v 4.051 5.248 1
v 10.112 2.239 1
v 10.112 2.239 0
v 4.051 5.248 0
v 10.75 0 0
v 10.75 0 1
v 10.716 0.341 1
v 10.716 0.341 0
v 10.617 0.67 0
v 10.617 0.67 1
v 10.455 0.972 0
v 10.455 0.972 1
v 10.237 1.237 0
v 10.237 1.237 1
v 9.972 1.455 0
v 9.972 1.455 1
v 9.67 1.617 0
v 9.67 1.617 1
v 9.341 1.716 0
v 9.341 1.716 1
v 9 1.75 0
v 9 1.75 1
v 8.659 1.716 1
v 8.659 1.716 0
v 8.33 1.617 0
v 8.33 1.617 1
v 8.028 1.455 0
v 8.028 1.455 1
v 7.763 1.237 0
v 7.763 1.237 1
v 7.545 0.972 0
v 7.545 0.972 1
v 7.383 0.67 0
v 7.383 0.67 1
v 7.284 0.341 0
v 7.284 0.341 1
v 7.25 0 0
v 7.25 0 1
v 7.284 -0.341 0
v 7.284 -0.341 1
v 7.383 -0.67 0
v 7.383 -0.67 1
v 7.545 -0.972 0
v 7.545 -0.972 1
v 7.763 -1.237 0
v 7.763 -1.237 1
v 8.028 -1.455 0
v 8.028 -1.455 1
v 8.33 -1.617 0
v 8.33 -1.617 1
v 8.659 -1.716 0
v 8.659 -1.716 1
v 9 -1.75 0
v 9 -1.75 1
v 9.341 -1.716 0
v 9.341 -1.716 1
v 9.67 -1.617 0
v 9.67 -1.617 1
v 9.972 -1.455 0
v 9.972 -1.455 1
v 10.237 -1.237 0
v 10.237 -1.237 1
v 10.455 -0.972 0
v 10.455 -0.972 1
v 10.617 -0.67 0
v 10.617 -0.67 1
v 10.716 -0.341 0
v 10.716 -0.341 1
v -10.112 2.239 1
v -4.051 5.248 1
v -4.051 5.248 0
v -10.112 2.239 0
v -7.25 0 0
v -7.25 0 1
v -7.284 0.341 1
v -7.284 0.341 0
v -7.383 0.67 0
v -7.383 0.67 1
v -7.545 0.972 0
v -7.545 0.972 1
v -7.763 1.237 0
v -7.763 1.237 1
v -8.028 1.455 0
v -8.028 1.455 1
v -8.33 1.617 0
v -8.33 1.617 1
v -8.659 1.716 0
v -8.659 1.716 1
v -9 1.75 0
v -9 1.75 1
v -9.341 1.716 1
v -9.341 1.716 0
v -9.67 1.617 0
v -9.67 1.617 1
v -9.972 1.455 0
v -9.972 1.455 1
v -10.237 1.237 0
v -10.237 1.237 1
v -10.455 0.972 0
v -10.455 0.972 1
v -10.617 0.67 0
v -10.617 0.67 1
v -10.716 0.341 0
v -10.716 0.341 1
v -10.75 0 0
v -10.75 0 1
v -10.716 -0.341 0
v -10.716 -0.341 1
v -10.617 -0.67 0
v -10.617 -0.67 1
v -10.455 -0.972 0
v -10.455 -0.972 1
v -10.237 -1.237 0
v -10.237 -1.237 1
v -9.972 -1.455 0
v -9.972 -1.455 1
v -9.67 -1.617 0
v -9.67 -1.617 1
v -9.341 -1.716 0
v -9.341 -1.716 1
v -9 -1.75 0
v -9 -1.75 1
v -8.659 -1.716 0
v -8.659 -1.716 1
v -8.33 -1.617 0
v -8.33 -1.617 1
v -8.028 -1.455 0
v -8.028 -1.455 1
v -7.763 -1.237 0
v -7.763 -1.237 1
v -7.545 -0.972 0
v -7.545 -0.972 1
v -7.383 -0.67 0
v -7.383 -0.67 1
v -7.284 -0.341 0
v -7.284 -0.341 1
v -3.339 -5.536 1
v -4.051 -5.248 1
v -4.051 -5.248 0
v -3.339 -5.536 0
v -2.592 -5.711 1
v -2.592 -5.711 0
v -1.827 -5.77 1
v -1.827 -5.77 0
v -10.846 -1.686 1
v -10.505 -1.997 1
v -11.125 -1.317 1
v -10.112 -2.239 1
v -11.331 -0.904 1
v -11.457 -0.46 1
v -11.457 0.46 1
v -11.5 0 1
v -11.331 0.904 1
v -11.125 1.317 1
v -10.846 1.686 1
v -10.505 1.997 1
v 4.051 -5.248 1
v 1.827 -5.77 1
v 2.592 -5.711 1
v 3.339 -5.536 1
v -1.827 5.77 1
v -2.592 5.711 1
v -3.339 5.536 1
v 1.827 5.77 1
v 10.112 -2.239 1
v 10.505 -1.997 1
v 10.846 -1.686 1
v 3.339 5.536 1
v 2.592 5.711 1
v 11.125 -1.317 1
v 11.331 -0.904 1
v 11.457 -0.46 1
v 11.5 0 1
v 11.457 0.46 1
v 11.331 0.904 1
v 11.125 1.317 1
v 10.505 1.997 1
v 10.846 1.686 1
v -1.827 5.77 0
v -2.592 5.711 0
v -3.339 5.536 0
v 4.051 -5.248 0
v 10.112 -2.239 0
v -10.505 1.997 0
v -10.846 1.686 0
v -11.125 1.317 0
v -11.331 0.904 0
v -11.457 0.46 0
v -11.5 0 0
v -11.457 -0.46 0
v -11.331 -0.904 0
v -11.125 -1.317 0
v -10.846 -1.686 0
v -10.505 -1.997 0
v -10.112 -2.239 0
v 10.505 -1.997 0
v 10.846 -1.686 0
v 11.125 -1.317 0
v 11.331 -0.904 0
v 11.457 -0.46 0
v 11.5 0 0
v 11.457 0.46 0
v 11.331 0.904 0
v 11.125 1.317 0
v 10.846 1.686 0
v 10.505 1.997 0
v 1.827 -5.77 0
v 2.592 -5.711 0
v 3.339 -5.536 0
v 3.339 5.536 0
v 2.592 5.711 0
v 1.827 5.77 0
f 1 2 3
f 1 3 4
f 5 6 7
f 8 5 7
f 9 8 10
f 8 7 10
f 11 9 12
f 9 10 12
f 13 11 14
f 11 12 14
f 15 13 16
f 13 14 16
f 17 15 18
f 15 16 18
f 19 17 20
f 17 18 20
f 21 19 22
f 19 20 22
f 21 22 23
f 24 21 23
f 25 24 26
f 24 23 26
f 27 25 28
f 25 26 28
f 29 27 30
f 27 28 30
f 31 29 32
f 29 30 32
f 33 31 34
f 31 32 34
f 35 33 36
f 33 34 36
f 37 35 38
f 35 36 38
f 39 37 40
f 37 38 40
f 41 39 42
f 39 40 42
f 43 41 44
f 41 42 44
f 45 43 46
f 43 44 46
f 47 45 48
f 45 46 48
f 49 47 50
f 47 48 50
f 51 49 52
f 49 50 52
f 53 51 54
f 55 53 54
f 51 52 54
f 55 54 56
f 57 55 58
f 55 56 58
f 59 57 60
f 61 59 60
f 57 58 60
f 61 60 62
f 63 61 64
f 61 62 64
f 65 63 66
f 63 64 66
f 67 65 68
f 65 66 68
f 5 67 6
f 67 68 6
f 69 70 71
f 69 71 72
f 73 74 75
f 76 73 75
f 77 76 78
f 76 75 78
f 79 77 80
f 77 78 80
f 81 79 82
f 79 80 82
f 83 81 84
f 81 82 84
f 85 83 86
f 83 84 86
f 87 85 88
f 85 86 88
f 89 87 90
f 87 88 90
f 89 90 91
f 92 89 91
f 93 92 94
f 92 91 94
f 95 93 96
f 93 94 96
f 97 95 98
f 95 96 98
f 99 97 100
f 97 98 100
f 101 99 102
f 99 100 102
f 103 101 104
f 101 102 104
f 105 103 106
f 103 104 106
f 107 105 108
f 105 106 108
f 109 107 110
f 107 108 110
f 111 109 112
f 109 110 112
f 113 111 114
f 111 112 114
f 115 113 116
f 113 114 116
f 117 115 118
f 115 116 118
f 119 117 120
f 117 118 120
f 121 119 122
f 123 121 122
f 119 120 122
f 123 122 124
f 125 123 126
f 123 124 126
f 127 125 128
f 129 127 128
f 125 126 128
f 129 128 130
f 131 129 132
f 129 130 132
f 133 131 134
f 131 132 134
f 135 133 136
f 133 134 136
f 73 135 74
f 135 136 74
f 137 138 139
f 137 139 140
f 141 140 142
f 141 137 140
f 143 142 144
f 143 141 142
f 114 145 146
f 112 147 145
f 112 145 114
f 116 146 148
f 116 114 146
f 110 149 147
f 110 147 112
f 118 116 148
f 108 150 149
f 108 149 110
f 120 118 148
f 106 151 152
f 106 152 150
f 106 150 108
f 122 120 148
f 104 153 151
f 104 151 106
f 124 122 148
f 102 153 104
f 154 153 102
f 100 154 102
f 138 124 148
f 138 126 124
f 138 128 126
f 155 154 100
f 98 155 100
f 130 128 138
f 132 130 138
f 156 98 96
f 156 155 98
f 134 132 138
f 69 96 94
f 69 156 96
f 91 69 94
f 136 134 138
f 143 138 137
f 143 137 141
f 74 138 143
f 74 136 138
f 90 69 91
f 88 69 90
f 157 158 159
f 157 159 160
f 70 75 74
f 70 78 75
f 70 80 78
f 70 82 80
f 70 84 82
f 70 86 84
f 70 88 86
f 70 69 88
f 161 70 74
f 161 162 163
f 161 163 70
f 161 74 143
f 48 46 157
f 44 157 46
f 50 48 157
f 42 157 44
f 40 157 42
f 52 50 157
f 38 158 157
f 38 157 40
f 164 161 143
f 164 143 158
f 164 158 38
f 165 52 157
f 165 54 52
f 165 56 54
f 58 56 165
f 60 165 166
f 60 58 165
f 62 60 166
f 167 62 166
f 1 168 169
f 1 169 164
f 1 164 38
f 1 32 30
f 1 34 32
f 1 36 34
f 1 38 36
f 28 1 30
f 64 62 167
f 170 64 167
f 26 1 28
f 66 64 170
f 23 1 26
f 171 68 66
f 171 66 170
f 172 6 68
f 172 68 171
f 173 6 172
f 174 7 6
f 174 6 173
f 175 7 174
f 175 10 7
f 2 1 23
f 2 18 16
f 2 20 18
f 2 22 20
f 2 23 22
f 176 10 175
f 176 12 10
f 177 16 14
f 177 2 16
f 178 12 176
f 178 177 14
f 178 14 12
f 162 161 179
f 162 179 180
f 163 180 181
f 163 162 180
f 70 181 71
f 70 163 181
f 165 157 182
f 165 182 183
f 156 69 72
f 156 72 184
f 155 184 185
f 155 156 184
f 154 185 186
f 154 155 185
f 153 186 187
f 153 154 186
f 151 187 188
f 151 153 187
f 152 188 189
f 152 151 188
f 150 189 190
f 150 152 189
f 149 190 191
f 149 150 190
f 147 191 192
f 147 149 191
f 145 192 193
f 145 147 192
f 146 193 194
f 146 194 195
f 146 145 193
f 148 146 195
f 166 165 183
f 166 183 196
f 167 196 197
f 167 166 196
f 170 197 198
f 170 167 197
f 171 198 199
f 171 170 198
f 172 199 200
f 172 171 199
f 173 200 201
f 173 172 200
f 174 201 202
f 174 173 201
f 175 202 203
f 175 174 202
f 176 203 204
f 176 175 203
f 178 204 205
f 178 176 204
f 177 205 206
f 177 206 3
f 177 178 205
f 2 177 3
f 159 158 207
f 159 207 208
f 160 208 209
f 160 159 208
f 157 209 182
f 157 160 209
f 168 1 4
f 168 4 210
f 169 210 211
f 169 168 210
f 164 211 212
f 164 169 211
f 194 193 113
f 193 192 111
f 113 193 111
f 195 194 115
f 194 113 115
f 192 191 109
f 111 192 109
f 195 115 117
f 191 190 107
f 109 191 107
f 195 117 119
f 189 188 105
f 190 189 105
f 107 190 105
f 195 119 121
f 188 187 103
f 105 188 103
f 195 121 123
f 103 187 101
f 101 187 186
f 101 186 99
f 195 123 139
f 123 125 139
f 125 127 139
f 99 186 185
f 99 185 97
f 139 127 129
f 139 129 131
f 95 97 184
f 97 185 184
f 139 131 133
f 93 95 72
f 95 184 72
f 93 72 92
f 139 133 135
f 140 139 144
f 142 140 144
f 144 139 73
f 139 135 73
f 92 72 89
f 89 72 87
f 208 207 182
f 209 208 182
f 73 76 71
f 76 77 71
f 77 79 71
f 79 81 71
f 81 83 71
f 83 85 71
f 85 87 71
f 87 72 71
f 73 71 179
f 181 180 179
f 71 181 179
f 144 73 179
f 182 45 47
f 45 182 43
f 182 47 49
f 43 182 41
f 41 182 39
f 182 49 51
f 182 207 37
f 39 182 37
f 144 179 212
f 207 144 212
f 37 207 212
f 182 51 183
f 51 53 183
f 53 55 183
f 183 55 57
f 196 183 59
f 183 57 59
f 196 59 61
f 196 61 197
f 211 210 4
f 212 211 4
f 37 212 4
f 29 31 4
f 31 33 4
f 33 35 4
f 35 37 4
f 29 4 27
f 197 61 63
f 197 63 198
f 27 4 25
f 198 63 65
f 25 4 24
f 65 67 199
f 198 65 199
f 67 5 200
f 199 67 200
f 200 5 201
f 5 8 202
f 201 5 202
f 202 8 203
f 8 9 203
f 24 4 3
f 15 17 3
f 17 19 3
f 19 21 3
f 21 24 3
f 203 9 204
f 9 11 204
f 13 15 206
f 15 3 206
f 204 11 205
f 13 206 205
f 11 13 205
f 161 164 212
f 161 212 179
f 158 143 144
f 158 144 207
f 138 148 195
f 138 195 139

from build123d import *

# Parameters (mm, degrees)
F4_R     = 1.75
F5_DEPTH = 1


with BuildPart() as f5:
    # F4 (on offset) → F5 (new body, through all)
    with BuildSketch(Plane.XY.offset(1)):
        with BuildLine():
            Line((-4.0505398426, 5.2484339749), (-10.1117136696, 2.2392169874))
            ThreePointArc((-10.1117136696, 2.2392169874), (-11.5, 0), (-10.1117136696, -2.2392169874))
            Line((-10.1117136696, -2.2392169874), (-4.0505398426, -5.2484339749))
            ThreePointArc((-4.0505398426, -5.2484339749), (-2.9690035065, -5.6378624608), (-1.8271125035, -5.77))
            Line((-1.8271125035, -5.77), (0, -5.77))
            Line((0, -5.77), (1.8271125035, -5.77))
            ThreePointArc((1.8271125035, -5.77), (2.9690035065, -5.6378624608), (4.0505398426, -5.2484339749))
            Line((4.0505398426, -5.2484339749), (10.1117136696, -2.2392169874))
            ThreePointArc((10.1117136696, -2.2392169874), (11.5, 0), (10.1117136696, 2.2392169874))
            Line((10.1117136696, 2.2392169874), (4.0505398426, 5.2484339749))
            ThreePointArc((4.0505398426, 5.2484339749), (2.9690035065, 5.6378624608), (1.8271125035, 5.77))
            Line((1.8271125035, 5.77), (0, 5.77))
            Line((0, 5.77), (-1.8271125035, 5.77))
            ThreePointArc((-1.8271125035, 5.77), (-2.9690035065, 5.6378624608), (-4.0505398426, 5.2484339749))
        make_face()
        with Locations((-9, 0)):
            Circle(F4_R, mode=Mode.SUBTRACT)
        with Locations((9, 0)):
            Circle(F4_R, mode=Mode.SUBTRACT)
    extrude(amount=-F5_DEPTH)


solid = f5.part
